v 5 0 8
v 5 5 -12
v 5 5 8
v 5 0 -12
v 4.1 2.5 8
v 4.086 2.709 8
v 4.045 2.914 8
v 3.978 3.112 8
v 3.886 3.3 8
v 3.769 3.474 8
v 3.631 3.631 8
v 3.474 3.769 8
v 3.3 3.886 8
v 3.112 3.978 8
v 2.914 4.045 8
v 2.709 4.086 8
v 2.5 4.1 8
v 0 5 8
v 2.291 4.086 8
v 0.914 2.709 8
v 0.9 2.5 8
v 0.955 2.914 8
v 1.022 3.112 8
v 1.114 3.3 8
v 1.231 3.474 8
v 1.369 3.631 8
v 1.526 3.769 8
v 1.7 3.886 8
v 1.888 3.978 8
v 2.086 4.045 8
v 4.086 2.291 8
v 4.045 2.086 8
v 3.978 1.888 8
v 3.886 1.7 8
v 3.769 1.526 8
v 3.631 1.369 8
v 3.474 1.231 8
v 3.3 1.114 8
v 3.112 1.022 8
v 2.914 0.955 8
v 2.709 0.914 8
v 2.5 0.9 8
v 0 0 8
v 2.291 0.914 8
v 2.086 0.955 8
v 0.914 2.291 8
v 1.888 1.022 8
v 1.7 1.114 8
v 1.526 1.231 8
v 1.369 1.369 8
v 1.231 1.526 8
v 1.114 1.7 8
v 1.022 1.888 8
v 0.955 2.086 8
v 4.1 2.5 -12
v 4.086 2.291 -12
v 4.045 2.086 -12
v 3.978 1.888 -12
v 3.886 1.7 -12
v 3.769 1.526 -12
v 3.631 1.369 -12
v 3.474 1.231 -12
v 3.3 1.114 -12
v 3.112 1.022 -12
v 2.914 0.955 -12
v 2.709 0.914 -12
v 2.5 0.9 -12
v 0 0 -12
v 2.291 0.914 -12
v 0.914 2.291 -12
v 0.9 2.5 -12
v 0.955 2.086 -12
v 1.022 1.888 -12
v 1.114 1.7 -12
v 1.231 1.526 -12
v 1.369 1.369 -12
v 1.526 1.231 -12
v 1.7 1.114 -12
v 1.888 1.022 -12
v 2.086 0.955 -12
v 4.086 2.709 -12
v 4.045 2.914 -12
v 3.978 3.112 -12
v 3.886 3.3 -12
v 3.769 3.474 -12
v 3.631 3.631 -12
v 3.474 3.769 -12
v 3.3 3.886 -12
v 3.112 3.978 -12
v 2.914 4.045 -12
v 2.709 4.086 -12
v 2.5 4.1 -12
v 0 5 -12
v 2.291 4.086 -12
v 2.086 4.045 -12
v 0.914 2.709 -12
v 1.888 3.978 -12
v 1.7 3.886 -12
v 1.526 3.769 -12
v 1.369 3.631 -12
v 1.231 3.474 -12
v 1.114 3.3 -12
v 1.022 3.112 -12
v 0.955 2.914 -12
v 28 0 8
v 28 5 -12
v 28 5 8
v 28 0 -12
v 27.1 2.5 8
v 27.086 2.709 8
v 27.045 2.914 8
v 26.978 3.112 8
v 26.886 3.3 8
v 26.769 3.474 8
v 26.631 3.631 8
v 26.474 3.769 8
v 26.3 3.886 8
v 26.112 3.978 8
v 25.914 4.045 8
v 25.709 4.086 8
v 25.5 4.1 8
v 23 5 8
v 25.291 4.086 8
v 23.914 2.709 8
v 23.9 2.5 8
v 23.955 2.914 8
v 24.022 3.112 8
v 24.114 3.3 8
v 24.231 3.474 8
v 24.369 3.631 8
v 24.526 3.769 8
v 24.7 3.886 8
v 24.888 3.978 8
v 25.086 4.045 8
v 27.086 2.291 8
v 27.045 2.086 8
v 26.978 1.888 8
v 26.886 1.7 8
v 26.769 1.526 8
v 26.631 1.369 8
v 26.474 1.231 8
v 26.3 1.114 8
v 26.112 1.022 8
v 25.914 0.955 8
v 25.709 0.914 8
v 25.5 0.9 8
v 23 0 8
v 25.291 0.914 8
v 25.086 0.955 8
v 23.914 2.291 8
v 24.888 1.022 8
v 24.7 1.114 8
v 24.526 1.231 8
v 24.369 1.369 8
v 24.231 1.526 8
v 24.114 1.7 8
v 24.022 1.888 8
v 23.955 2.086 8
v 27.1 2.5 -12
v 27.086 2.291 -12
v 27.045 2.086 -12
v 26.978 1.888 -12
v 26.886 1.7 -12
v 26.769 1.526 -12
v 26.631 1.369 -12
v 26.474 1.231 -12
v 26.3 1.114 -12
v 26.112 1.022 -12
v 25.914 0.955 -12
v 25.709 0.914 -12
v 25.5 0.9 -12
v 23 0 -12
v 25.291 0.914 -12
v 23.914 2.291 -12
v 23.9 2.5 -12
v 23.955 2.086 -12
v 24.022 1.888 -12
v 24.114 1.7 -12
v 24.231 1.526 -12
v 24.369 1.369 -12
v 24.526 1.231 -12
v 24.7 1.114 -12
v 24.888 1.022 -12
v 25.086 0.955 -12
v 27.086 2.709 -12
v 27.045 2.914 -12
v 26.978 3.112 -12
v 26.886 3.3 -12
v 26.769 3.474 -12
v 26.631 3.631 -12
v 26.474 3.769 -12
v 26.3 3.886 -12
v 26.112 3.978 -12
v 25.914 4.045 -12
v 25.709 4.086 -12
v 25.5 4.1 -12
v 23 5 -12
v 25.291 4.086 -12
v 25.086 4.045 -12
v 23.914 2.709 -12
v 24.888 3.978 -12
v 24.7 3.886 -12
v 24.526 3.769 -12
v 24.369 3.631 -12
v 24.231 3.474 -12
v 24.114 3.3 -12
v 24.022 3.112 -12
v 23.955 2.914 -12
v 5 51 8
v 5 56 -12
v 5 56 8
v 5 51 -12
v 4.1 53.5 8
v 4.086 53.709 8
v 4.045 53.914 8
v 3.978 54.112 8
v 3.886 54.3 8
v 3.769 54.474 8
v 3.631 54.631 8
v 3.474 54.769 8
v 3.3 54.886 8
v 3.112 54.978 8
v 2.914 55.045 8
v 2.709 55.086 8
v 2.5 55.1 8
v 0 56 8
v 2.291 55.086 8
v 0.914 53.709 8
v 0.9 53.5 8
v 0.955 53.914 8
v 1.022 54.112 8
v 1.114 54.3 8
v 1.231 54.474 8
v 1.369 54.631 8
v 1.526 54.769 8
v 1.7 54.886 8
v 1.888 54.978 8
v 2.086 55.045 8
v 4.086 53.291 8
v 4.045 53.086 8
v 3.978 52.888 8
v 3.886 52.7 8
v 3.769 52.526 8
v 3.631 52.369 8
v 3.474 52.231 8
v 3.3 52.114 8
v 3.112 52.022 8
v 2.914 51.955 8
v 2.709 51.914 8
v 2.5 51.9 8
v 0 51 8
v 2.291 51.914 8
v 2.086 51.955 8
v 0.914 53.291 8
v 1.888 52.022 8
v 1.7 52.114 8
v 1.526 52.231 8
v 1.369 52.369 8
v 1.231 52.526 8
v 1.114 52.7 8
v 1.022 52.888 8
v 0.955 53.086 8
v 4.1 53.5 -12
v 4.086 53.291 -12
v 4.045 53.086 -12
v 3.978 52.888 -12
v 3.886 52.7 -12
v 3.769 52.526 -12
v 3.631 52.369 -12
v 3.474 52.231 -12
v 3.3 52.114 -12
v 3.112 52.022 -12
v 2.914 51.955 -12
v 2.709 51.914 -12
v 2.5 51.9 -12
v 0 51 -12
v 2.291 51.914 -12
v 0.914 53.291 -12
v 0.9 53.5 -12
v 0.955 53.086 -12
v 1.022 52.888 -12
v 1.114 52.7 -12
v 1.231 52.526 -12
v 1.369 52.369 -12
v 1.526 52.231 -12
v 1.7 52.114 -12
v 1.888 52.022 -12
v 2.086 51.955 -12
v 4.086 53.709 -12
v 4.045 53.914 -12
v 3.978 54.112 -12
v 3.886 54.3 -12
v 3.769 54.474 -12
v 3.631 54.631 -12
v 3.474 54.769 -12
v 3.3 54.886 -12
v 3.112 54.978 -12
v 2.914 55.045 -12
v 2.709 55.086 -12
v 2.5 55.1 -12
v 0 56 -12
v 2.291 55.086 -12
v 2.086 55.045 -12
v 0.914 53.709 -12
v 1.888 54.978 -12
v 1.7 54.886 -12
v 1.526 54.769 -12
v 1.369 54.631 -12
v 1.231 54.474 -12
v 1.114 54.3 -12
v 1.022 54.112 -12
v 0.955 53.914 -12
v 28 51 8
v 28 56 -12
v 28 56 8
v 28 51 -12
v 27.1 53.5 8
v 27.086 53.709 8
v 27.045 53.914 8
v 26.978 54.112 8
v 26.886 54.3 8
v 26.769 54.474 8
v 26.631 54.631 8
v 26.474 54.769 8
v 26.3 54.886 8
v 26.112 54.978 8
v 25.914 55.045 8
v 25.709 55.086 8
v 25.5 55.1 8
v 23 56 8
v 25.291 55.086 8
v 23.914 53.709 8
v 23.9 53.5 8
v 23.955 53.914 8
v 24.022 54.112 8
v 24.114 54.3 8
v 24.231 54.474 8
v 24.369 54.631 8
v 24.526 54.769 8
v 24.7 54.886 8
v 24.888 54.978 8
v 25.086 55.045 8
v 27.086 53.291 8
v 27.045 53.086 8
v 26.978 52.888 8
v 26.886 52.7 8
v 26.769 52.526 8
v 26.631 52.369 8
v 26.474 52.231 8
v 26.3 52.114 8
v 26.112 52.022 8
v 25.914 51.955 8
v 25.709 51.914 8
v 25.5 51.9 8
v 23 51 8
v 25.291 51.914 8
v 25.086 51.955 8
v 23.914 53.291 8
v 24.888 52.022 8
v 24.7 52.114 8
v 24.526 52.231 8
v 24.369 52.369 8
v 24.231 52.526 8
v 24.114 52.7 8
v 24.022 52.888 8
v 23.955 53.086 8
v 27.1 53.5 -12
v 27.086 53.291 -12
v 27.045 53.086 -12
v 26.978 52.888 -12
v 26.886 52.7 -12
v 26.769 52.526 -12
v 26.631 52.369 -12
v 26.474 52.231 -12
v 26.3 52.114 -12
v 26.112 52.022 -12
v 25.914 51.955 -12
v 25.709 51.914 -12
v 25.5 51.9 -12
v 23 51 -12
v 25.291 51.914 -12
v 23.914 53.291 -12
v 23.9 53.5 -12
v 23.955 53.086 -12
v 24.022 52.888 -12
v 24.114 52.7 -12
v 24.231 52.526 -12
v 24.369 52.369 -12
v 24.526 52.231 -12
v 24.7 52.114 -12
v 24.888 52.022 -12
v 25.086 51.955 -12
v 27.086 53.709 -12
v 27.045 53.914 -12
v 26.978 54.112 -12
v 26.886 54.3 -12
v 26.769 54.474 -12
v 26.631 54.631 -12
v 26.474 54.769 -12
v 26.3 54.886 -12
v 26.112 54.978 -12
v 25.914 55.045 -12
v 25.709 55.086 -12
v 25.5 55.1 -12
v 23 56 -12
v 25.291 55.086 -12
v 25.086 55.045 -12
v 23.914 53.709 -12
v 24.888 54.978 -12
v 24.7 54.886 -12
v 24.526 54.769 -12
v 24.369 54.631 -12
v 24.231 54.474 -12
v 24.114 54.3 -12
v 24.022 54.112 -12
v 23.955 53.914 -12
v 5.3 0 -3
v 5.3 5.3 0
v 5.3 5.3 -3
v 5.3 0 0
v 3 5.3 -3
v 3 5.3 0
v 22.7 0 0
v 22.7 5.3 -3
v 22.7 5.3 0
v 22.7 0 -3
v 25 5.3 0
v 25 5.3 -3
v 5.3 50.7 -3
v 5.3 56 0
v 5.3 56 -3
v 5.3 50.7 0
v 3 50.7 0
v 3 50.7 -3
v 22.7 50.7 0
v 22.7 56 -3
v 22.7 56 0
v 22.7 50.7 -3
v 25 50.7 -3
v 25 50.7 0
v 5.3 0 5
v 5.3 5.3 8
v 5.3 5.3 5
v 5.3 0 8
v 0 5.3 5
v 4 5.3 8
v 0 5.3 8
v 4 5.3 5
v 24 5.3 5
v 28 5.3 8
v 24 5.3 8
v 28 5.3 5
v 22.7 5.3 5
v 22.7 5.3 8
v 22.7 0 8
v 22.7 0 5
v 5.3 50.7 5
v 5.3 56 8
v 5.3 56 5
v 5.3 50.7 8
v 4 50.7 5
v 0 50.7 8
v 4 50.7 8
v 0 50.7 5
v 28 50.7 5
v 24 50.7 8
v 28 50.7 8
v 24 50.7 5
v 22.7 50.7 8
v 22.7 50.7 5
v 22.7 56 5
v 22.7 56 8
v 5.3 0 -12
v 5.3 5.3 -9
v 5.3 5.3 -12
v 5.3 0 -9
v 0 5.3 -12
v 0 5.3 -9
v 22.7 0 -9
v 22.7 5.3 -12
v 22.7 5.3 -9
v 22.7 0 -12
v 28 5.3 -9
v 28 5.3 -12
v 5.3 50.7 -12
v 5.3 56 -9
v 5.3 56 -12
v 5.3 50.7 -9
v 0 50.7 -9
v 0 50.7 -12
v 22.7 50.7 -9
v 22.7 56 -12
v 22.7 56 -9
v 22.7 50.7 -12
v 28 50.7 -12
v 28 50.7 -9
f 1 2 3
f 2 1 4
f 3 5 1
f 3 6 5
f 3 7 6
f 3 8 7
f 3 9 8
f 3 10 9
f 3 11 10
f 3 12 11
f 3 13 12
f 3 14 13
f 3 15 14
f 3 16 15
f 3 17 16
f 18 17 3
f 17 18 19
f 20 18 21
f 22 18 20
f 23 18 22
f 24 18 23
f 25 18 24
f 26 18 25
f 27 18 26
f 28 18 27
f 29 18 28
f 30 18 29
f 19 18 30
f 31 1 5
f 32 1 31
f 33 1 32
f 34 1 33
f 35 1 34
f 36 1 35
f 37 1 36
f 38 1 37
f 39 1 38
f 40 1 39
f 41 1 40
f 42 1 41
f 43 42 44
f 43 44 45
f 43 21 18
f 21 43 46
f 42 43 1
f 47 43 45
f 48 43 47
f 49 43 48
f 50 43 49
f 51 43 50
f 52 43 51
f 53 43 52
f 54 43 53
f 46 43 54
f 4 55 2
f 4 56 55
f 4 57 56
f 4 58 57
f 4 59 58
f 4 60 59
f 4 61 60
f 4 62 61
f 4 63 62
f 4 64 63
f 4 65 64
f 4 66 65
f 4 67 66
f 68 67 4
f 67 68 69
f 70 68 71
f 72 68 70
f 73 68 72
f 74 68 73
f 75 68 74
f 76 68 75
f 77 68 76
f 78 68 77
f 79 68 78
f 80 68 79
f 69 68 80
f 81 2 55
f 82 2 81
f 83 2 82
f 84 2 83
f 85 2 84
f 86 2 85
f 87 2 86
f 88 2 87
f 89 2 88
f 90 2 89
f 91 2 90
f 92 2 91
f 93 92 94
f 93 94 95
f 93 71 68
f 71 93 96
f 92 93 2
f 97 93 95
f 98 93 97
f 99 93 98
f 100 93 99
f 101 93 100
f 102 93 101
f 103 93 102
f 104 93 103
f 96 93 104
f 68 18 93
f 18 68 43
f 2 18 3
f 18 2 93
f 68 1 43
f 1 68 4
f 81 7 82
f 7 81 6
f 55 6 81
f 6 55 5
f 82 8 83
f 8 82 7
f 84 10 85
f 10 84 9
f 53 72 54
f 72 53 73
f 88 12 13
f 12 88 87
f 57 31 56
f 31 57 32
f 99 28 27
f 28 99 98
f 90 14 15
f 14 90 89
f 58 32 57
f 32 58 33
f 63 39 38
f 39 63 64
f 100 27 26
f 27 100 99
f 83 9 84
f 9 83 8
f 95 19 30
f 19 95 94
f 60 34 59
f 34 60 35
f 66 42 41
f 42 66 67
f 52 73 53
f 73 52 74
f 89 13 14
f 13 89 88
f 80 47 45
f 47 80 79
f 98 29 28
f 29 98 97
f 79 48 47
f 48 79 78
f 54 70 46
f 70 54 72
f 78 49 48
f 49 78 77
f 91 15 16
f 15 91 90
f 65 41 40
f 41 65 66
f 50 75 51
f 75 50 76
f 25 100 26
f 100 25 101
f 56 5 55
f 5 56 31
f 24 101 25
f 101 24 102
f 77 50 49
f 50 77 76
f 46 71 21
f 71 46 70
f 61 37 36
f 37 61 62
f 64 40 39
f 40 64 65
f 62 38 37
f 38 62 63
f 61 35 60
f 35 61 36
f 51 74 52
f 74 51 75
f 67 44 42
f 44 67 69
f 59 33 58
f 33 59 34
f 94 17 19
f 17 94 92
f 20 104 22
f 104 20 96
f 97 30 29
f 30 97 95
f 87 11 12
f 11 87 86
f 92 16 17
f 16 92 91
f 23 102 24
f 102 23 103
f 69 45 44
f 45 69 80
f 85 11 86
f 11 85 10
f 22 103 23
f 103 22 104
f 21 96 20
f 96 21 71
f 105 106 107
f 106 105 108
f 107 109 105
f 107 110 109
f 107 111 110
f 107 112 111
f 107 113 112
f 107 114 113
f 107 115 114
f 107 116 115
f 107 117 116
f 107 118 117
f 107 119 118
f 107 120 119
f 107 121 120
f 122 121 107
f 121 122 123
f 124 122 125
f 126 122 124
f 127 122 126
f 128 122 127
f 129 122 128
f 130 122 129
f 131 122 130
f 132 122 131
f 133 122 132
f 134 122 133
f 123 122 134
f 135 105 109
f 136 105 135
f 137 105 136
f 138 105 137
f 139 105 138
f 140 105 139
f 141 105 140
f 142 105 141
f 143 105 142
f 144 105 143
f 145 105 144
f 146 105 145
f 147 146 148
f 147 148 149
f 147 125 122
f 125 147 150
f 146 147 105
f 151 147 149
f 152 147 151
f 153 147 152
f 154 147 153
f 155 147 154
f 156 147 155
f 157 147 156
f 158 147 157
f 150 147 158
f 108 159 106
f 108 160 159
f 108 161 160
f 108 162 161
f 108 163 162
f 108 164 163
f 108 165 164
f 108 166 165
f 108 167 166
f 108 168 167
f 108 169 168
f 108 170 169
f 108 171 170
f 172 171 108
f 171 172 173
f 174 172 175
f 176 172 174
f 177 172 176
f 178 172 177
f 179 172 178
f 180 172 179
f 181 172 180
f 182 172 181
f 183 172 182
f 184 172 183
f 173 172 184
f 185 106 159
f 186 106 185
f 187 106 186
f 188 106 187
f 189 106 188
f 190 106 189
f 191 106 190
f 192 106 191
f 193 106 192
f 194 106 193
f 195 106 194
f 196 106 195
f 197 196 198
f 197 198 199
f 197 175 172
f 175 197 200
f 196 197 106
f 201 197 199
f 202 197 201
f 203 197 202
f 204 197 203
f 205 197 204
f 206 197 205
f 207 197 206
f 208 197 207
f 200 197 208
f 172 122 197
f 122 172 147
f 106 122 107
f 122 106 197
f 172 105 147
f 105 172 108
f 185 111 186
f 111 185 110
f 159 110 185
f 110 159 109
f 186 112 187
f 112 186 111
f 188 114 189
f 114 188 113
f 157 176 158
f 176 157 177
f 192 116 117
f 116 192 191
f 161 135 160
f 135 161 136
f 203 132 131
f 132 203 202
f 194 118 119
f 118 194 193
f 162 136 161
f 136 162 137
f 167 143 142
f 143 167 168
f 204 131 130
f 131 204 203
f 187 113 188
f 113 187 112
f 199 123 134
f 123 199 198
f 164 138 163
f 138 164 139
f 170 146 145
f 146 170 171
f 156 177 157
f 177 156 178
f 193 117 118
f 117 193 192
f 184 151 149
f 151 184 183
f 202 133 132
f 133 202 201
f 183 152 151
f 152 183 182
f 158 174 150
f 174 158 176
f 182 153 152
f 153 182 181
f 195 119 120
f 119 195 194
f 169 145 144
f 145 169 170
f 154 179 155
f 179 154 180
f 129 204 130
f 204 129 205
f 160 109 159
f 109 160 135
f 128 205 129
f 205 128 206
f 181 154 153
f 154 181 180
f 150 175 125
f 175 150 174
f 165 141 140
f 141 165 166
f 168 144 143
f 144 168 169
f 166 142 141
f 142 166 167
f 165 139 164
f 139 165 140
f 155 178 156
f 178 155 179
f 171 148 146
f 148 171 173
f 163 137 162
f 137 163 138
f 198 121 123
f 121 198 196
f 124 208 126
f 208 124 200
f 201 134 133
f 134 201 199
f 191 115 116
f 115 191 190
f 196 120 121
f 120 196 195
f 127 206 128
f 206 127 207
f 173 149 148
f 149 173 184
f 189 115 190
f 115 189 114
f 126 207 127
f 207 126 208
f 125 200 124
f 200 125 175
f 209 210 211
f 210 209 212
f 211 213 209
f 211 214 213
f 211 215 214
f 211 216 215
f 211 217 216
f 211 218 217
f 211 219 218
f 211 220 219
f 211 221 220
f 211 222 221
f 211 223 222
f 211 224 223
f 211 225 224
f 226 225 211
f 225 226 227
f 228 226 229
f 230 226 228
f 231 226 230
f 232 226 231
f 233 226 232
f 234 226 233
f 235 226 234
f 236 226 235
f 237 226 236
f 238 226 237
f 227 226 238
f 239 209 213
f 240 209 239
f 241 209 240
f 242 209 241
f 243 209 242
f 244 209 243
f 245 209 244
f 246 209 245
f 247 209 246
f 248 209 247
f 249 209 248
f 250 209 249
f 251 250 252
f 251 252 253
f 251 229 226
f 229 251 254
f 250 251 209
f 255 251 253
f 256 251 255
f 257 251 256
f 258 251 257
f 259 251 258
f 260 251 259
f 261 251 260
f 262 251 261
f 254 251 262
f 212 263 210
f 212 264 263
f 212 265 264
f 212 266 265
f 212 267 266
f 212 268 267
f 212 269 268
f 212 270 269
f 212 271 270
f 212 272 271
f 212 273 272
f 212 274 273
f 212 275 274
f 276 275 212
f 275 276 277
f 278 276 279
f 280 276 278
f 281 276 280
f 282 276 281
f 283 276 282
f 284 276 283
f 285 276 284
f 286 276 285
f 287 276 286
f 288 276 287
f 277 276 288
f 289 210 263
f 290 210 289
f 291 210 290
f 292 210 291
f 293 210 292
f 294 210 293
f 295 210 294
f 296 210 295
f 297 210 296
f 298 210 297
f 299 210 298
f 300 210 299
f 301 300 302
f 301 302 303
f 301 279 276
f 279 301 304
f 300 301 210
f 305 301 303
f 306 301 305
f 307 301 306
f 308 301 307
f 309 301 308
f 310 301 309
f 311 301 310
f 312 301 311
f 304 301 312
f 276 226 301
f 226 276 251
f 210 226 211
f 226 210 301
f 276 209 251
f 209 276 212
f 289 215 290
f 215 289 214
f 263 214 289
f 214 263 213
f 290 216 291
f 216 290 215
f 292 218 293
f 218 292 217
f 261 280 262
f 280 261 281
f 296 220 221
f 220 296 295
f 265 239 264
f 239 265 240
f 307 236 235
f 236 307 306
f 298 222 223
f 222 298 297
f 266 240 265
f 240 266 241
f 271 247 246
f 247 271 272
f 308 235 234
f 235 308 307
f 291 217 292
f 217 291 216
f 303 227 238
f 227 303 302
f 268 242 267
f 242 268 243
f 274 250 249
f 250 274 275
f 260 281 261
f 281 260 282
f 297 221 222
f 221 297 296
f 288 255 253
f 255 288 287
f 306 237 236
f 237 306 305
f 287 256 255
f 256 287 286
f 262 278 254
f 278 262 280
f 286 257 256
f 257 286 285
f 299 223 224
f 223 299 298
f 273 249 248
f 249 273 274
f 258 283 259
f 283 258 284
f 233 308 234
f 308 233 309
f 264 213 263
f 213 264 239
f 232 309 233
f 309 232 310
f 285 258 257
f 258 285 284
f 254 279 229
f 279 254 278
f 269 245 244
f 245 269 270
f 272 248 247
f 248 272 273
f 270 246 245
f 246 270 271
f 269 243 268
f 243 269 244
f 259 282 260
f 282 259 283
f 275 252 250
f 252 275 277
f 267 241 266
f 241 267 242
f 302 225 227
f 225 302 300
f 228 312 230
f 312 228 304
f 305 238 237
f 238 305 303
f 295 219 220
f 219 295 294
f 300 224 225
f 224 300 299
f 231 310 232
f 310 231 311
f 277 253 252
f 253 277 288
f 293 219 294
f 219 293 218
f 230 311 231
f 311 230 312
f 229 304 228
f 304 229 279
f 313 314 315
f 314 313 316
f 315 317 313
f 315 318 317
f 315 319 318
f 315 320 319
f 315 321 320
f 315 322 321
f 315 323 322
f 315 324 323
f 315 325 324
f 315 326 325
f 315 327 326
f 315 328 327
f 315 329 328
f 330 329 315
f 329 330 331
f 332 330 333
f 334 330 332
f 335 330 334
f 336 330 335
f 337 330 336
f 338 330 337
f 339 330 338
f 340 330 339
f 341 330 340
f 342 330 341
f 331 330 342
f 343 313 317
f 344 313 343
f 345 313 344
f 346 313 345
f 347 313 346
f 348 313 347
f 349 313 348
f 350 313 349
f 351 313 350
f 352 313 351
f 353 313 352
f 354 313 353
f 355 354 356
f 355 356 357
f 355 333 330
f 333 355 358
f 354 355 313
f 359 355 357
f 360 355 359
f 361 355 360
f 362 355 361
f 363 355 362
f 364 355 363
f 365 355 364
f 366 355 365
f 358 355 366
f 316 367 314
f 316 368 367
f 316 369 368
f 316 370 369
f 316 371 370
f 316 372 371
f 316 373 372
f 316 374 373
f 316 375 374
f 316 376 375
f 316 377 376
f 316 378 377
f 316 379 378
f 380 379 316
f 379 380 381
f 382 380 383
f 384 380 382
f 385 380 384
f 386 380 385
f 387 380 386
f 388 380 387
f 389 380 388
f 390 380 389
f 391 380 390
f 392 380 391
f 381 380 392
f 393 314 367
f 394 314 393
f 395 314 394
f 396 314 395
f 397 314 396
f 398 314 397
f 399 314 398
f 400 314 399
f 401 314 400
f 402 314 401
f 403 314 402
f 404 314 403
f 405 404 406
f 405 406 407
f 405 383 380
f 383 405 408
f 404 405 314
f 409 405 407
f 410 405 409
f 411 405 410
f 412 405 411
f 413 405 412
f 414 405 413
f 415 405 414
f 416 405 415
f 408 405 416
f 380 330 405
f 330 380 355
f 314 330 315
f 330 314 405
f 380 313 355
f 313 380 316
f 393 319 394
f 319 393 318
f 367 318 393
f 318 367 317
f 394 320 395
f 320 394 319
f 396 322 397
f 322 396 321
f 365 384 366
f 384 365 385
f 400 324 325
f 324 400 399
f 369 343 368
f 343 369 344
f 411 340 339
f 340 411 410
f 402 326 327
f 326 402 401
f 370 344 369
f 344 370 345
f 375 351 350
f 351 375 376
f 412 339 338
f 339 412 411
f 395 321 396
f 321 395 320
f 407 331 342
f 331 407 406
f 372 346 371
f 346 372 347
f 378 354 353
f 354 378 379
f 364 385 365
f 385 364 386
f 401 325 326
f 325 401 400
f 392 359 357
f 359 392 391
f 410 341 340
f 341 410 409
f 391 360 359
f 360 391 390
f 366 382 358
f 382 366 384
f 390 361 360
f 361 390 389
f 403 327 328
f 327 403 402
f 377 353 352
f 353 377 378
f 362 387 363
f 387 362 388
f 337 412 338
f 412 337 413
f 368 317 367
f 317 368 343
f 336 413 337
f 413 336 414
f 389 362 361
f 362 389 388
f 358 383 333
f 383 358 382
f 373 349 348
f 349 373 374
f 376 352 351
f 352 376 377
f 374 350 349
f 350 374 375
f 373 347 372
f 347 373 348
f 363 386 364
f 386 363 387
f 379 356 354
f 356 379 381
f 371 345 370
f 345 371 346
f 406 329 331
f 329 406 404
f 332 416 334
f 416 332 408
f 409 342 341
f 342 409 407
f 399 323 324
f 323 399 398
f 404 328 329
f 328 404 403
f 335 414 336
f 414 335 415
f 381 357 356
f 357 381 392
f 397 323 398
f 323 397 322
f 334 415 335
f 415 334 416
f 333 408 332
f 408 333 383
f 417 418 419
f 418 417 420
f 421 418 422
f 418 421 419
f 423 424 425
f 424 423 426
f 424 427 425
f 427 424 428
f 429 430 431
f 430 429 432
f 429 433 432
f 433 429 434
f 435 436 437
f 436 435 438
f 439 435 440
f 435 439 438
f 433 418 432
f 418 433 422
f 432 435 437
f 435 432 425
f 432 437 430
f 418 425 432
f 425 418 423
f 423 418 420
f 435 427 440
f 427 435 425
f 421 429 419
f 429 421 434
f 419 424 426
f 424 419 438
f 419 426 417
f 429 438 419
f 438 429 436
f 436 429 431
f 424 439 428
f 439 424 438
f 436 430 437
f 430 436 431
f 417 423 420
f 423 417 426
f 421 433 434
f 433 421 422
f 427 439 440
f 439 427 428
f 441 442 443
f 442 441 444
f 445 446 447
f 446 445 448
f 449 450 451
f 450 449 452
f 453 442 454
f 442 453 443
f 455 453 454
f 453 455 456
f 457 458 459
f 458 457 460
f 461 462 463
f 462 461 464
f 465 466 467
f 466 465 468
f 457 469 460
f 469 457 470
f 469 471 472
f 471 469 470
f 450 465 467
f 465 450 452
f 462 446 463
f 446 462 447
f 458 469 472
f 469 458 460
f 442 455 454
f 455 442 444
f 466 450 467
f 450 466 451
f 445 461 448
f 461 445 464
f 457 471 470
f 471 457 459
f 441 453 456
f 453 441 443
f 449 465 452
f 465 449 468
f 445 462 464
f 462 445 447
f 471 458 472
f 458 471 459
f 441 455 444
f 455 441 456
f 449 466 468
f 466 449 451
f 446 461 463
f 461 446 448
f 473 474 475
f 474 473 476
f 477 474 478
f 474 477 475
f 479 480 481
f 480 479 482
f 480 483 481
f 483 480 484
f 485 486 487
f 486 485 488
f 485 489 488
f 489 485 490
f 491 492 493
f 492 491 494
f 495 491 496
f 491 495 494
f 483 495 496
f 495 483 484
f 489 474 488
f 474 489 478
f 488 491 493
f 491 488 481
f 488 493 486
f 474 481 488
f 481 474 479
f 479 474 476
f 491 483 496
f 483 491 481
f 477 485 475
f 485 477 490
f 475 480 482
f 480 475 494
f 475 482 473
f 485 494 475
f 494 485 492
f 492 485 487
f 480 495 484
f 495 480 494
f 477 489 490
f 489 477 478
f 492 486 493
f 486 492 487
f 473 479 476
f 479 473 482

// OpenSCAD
// ESP32-S3-WROOM DevKit — 3-plate sandwich mount
// Top plate + middle plate (under board, between header pins) + bottom plate
// 4 corner pillars clamp the stack with M3 screws.

$fn = 48;

// ---- Board dimensions (Olimex ESP32-S3-DevKit-Lipo) ----
board_len       = 56;
board_wid       = 28;
board_thk       = 1.6;
antenna_wid     = 18;
antenna_proj    = 6;
header_gap      = 22;   // inner span between header pin rows

// ---- Mount geometry ----
pillar          = 5;    // 5mm square corner pillars
plate_thk       = 3;
top_gap         = 5;    // top plate sits 5mm above mid plate
pin_gap         = 6;    // bottom plate sits 6mm below mid plate
center_window   = 20;   // top-plate cutout width (runs along length)

// ---- Hardware ----
screw_clr       = 3.2;  // M3 clearance hole
slop            = 0.3;

// ---- Z anchors (z=0 is top face of mid plate = board bottom) ----
z_mid_top       = 0;
z_mid_bot       = -plate_thk;
z_top_bot       = top_gap;
z_top_top       = top_gap + plate_thk;
z_bot_top       = -plate_thk - pin_gap;
z_bot_bot       = -plate_thk - pin_gap - plate_thk;
pillar_h        = z_top_top - z_bot_bot;

// ---- Corner pillar positions (lower-left, in board coords) ----
// Top pair sit in the 5mm strips flanking the antenna.
// Bottom pair sit at the far short edge.
header_strip    = (board_wid - header_gap) / 2;  // 3mm on each long edge

pillar_xy = [
    [0,                  0                 ],   // bottom-left
    [board_wid - pillar, 0                 ],   // bottom-right
    [0,                  board_len - pillar],   // top-left (beside antenna)
    [board_wid - pillar, board_len - pillar],   // top-right (beside antenna)
];

// ---- Modules ----
module pillars() {
    for (p = pillar_xy)
        translate([p[0], p[1], z_bot_bot])
            difference() {
                cube([pillar, pillar, pillar_h]);
                translate([pillar/2, pillar/2, -1])
                    cylinder(h = pillar_h + 2, d = screw_clr);
            }
}

// 28x56 plate with 5x5 corner notches so pillars pass through.
module plate_base() {
    difference() {
        cube([board_wid, board_len, plate_thk]);
        for (p = pillar_xy)
            translate([p[0] - slop, p[1] - slop, -1])
                cube([pillar + 2*slop, pillar + 2*slop, plate_thk + 2]);
    }
}

// Middle plate: full footprint minus header pin slots so pins clear the plate.
module mid_plate() {
    translate([0, 0, z_mid_bot])
        difference() {
            plate_base();
            translate([0, pillar + slop, -1])
                cube([header_strip, board_len - 2*pillar - 2*slop, plate_thk + 2]);
            translate([board_wid - header_strip, pillar + slop, -1])
                cube([header_strip, board_len - 2*pillar - 2*slop, plate_thk + 2]);
        }
}

// Top plate: full footprint minus a 20mm-wide window over the WROOM module.
module top_plate() {
    translate([0, 0, z_top_bot])
        difference() {
            plate_base();
            translate([(board_wid - center_window)/2, pillar + slop, -1])
                cube([center_window, board_len - 2*pillar - 2*slop, plate_thk + 2]);
        }
}

// Bottom plate: solid, 6mm below mid plate (header pins clear it).
module bot_plate() {
    translate([0, 0, z_bot_bot])
        plate_base();
}

// ---- Preview: translucent board + antenna ----
module board_preview() {
    color("darkgreen", 0.4)
        difference() {
            cube([board_wid, board_len, board_thk]);
            for (p = pillar_xy)
                translate([p[0] - slop, p[1] - slop, -1])
                    cube([pillar + 2*slop, pillar + 2*slop, board_thk + 2]);
        }
    color("silver", 0.5)
        translate([(board_wid - antenna_wid)/2, board_len, board_thk - 0.5])
            cube([antenna_wid, antenna_proj, 0.5]);
}

// ---- Assembly ----
pillars();
mid_plate();
top_plate();
bot_plate();
%board_preview();
